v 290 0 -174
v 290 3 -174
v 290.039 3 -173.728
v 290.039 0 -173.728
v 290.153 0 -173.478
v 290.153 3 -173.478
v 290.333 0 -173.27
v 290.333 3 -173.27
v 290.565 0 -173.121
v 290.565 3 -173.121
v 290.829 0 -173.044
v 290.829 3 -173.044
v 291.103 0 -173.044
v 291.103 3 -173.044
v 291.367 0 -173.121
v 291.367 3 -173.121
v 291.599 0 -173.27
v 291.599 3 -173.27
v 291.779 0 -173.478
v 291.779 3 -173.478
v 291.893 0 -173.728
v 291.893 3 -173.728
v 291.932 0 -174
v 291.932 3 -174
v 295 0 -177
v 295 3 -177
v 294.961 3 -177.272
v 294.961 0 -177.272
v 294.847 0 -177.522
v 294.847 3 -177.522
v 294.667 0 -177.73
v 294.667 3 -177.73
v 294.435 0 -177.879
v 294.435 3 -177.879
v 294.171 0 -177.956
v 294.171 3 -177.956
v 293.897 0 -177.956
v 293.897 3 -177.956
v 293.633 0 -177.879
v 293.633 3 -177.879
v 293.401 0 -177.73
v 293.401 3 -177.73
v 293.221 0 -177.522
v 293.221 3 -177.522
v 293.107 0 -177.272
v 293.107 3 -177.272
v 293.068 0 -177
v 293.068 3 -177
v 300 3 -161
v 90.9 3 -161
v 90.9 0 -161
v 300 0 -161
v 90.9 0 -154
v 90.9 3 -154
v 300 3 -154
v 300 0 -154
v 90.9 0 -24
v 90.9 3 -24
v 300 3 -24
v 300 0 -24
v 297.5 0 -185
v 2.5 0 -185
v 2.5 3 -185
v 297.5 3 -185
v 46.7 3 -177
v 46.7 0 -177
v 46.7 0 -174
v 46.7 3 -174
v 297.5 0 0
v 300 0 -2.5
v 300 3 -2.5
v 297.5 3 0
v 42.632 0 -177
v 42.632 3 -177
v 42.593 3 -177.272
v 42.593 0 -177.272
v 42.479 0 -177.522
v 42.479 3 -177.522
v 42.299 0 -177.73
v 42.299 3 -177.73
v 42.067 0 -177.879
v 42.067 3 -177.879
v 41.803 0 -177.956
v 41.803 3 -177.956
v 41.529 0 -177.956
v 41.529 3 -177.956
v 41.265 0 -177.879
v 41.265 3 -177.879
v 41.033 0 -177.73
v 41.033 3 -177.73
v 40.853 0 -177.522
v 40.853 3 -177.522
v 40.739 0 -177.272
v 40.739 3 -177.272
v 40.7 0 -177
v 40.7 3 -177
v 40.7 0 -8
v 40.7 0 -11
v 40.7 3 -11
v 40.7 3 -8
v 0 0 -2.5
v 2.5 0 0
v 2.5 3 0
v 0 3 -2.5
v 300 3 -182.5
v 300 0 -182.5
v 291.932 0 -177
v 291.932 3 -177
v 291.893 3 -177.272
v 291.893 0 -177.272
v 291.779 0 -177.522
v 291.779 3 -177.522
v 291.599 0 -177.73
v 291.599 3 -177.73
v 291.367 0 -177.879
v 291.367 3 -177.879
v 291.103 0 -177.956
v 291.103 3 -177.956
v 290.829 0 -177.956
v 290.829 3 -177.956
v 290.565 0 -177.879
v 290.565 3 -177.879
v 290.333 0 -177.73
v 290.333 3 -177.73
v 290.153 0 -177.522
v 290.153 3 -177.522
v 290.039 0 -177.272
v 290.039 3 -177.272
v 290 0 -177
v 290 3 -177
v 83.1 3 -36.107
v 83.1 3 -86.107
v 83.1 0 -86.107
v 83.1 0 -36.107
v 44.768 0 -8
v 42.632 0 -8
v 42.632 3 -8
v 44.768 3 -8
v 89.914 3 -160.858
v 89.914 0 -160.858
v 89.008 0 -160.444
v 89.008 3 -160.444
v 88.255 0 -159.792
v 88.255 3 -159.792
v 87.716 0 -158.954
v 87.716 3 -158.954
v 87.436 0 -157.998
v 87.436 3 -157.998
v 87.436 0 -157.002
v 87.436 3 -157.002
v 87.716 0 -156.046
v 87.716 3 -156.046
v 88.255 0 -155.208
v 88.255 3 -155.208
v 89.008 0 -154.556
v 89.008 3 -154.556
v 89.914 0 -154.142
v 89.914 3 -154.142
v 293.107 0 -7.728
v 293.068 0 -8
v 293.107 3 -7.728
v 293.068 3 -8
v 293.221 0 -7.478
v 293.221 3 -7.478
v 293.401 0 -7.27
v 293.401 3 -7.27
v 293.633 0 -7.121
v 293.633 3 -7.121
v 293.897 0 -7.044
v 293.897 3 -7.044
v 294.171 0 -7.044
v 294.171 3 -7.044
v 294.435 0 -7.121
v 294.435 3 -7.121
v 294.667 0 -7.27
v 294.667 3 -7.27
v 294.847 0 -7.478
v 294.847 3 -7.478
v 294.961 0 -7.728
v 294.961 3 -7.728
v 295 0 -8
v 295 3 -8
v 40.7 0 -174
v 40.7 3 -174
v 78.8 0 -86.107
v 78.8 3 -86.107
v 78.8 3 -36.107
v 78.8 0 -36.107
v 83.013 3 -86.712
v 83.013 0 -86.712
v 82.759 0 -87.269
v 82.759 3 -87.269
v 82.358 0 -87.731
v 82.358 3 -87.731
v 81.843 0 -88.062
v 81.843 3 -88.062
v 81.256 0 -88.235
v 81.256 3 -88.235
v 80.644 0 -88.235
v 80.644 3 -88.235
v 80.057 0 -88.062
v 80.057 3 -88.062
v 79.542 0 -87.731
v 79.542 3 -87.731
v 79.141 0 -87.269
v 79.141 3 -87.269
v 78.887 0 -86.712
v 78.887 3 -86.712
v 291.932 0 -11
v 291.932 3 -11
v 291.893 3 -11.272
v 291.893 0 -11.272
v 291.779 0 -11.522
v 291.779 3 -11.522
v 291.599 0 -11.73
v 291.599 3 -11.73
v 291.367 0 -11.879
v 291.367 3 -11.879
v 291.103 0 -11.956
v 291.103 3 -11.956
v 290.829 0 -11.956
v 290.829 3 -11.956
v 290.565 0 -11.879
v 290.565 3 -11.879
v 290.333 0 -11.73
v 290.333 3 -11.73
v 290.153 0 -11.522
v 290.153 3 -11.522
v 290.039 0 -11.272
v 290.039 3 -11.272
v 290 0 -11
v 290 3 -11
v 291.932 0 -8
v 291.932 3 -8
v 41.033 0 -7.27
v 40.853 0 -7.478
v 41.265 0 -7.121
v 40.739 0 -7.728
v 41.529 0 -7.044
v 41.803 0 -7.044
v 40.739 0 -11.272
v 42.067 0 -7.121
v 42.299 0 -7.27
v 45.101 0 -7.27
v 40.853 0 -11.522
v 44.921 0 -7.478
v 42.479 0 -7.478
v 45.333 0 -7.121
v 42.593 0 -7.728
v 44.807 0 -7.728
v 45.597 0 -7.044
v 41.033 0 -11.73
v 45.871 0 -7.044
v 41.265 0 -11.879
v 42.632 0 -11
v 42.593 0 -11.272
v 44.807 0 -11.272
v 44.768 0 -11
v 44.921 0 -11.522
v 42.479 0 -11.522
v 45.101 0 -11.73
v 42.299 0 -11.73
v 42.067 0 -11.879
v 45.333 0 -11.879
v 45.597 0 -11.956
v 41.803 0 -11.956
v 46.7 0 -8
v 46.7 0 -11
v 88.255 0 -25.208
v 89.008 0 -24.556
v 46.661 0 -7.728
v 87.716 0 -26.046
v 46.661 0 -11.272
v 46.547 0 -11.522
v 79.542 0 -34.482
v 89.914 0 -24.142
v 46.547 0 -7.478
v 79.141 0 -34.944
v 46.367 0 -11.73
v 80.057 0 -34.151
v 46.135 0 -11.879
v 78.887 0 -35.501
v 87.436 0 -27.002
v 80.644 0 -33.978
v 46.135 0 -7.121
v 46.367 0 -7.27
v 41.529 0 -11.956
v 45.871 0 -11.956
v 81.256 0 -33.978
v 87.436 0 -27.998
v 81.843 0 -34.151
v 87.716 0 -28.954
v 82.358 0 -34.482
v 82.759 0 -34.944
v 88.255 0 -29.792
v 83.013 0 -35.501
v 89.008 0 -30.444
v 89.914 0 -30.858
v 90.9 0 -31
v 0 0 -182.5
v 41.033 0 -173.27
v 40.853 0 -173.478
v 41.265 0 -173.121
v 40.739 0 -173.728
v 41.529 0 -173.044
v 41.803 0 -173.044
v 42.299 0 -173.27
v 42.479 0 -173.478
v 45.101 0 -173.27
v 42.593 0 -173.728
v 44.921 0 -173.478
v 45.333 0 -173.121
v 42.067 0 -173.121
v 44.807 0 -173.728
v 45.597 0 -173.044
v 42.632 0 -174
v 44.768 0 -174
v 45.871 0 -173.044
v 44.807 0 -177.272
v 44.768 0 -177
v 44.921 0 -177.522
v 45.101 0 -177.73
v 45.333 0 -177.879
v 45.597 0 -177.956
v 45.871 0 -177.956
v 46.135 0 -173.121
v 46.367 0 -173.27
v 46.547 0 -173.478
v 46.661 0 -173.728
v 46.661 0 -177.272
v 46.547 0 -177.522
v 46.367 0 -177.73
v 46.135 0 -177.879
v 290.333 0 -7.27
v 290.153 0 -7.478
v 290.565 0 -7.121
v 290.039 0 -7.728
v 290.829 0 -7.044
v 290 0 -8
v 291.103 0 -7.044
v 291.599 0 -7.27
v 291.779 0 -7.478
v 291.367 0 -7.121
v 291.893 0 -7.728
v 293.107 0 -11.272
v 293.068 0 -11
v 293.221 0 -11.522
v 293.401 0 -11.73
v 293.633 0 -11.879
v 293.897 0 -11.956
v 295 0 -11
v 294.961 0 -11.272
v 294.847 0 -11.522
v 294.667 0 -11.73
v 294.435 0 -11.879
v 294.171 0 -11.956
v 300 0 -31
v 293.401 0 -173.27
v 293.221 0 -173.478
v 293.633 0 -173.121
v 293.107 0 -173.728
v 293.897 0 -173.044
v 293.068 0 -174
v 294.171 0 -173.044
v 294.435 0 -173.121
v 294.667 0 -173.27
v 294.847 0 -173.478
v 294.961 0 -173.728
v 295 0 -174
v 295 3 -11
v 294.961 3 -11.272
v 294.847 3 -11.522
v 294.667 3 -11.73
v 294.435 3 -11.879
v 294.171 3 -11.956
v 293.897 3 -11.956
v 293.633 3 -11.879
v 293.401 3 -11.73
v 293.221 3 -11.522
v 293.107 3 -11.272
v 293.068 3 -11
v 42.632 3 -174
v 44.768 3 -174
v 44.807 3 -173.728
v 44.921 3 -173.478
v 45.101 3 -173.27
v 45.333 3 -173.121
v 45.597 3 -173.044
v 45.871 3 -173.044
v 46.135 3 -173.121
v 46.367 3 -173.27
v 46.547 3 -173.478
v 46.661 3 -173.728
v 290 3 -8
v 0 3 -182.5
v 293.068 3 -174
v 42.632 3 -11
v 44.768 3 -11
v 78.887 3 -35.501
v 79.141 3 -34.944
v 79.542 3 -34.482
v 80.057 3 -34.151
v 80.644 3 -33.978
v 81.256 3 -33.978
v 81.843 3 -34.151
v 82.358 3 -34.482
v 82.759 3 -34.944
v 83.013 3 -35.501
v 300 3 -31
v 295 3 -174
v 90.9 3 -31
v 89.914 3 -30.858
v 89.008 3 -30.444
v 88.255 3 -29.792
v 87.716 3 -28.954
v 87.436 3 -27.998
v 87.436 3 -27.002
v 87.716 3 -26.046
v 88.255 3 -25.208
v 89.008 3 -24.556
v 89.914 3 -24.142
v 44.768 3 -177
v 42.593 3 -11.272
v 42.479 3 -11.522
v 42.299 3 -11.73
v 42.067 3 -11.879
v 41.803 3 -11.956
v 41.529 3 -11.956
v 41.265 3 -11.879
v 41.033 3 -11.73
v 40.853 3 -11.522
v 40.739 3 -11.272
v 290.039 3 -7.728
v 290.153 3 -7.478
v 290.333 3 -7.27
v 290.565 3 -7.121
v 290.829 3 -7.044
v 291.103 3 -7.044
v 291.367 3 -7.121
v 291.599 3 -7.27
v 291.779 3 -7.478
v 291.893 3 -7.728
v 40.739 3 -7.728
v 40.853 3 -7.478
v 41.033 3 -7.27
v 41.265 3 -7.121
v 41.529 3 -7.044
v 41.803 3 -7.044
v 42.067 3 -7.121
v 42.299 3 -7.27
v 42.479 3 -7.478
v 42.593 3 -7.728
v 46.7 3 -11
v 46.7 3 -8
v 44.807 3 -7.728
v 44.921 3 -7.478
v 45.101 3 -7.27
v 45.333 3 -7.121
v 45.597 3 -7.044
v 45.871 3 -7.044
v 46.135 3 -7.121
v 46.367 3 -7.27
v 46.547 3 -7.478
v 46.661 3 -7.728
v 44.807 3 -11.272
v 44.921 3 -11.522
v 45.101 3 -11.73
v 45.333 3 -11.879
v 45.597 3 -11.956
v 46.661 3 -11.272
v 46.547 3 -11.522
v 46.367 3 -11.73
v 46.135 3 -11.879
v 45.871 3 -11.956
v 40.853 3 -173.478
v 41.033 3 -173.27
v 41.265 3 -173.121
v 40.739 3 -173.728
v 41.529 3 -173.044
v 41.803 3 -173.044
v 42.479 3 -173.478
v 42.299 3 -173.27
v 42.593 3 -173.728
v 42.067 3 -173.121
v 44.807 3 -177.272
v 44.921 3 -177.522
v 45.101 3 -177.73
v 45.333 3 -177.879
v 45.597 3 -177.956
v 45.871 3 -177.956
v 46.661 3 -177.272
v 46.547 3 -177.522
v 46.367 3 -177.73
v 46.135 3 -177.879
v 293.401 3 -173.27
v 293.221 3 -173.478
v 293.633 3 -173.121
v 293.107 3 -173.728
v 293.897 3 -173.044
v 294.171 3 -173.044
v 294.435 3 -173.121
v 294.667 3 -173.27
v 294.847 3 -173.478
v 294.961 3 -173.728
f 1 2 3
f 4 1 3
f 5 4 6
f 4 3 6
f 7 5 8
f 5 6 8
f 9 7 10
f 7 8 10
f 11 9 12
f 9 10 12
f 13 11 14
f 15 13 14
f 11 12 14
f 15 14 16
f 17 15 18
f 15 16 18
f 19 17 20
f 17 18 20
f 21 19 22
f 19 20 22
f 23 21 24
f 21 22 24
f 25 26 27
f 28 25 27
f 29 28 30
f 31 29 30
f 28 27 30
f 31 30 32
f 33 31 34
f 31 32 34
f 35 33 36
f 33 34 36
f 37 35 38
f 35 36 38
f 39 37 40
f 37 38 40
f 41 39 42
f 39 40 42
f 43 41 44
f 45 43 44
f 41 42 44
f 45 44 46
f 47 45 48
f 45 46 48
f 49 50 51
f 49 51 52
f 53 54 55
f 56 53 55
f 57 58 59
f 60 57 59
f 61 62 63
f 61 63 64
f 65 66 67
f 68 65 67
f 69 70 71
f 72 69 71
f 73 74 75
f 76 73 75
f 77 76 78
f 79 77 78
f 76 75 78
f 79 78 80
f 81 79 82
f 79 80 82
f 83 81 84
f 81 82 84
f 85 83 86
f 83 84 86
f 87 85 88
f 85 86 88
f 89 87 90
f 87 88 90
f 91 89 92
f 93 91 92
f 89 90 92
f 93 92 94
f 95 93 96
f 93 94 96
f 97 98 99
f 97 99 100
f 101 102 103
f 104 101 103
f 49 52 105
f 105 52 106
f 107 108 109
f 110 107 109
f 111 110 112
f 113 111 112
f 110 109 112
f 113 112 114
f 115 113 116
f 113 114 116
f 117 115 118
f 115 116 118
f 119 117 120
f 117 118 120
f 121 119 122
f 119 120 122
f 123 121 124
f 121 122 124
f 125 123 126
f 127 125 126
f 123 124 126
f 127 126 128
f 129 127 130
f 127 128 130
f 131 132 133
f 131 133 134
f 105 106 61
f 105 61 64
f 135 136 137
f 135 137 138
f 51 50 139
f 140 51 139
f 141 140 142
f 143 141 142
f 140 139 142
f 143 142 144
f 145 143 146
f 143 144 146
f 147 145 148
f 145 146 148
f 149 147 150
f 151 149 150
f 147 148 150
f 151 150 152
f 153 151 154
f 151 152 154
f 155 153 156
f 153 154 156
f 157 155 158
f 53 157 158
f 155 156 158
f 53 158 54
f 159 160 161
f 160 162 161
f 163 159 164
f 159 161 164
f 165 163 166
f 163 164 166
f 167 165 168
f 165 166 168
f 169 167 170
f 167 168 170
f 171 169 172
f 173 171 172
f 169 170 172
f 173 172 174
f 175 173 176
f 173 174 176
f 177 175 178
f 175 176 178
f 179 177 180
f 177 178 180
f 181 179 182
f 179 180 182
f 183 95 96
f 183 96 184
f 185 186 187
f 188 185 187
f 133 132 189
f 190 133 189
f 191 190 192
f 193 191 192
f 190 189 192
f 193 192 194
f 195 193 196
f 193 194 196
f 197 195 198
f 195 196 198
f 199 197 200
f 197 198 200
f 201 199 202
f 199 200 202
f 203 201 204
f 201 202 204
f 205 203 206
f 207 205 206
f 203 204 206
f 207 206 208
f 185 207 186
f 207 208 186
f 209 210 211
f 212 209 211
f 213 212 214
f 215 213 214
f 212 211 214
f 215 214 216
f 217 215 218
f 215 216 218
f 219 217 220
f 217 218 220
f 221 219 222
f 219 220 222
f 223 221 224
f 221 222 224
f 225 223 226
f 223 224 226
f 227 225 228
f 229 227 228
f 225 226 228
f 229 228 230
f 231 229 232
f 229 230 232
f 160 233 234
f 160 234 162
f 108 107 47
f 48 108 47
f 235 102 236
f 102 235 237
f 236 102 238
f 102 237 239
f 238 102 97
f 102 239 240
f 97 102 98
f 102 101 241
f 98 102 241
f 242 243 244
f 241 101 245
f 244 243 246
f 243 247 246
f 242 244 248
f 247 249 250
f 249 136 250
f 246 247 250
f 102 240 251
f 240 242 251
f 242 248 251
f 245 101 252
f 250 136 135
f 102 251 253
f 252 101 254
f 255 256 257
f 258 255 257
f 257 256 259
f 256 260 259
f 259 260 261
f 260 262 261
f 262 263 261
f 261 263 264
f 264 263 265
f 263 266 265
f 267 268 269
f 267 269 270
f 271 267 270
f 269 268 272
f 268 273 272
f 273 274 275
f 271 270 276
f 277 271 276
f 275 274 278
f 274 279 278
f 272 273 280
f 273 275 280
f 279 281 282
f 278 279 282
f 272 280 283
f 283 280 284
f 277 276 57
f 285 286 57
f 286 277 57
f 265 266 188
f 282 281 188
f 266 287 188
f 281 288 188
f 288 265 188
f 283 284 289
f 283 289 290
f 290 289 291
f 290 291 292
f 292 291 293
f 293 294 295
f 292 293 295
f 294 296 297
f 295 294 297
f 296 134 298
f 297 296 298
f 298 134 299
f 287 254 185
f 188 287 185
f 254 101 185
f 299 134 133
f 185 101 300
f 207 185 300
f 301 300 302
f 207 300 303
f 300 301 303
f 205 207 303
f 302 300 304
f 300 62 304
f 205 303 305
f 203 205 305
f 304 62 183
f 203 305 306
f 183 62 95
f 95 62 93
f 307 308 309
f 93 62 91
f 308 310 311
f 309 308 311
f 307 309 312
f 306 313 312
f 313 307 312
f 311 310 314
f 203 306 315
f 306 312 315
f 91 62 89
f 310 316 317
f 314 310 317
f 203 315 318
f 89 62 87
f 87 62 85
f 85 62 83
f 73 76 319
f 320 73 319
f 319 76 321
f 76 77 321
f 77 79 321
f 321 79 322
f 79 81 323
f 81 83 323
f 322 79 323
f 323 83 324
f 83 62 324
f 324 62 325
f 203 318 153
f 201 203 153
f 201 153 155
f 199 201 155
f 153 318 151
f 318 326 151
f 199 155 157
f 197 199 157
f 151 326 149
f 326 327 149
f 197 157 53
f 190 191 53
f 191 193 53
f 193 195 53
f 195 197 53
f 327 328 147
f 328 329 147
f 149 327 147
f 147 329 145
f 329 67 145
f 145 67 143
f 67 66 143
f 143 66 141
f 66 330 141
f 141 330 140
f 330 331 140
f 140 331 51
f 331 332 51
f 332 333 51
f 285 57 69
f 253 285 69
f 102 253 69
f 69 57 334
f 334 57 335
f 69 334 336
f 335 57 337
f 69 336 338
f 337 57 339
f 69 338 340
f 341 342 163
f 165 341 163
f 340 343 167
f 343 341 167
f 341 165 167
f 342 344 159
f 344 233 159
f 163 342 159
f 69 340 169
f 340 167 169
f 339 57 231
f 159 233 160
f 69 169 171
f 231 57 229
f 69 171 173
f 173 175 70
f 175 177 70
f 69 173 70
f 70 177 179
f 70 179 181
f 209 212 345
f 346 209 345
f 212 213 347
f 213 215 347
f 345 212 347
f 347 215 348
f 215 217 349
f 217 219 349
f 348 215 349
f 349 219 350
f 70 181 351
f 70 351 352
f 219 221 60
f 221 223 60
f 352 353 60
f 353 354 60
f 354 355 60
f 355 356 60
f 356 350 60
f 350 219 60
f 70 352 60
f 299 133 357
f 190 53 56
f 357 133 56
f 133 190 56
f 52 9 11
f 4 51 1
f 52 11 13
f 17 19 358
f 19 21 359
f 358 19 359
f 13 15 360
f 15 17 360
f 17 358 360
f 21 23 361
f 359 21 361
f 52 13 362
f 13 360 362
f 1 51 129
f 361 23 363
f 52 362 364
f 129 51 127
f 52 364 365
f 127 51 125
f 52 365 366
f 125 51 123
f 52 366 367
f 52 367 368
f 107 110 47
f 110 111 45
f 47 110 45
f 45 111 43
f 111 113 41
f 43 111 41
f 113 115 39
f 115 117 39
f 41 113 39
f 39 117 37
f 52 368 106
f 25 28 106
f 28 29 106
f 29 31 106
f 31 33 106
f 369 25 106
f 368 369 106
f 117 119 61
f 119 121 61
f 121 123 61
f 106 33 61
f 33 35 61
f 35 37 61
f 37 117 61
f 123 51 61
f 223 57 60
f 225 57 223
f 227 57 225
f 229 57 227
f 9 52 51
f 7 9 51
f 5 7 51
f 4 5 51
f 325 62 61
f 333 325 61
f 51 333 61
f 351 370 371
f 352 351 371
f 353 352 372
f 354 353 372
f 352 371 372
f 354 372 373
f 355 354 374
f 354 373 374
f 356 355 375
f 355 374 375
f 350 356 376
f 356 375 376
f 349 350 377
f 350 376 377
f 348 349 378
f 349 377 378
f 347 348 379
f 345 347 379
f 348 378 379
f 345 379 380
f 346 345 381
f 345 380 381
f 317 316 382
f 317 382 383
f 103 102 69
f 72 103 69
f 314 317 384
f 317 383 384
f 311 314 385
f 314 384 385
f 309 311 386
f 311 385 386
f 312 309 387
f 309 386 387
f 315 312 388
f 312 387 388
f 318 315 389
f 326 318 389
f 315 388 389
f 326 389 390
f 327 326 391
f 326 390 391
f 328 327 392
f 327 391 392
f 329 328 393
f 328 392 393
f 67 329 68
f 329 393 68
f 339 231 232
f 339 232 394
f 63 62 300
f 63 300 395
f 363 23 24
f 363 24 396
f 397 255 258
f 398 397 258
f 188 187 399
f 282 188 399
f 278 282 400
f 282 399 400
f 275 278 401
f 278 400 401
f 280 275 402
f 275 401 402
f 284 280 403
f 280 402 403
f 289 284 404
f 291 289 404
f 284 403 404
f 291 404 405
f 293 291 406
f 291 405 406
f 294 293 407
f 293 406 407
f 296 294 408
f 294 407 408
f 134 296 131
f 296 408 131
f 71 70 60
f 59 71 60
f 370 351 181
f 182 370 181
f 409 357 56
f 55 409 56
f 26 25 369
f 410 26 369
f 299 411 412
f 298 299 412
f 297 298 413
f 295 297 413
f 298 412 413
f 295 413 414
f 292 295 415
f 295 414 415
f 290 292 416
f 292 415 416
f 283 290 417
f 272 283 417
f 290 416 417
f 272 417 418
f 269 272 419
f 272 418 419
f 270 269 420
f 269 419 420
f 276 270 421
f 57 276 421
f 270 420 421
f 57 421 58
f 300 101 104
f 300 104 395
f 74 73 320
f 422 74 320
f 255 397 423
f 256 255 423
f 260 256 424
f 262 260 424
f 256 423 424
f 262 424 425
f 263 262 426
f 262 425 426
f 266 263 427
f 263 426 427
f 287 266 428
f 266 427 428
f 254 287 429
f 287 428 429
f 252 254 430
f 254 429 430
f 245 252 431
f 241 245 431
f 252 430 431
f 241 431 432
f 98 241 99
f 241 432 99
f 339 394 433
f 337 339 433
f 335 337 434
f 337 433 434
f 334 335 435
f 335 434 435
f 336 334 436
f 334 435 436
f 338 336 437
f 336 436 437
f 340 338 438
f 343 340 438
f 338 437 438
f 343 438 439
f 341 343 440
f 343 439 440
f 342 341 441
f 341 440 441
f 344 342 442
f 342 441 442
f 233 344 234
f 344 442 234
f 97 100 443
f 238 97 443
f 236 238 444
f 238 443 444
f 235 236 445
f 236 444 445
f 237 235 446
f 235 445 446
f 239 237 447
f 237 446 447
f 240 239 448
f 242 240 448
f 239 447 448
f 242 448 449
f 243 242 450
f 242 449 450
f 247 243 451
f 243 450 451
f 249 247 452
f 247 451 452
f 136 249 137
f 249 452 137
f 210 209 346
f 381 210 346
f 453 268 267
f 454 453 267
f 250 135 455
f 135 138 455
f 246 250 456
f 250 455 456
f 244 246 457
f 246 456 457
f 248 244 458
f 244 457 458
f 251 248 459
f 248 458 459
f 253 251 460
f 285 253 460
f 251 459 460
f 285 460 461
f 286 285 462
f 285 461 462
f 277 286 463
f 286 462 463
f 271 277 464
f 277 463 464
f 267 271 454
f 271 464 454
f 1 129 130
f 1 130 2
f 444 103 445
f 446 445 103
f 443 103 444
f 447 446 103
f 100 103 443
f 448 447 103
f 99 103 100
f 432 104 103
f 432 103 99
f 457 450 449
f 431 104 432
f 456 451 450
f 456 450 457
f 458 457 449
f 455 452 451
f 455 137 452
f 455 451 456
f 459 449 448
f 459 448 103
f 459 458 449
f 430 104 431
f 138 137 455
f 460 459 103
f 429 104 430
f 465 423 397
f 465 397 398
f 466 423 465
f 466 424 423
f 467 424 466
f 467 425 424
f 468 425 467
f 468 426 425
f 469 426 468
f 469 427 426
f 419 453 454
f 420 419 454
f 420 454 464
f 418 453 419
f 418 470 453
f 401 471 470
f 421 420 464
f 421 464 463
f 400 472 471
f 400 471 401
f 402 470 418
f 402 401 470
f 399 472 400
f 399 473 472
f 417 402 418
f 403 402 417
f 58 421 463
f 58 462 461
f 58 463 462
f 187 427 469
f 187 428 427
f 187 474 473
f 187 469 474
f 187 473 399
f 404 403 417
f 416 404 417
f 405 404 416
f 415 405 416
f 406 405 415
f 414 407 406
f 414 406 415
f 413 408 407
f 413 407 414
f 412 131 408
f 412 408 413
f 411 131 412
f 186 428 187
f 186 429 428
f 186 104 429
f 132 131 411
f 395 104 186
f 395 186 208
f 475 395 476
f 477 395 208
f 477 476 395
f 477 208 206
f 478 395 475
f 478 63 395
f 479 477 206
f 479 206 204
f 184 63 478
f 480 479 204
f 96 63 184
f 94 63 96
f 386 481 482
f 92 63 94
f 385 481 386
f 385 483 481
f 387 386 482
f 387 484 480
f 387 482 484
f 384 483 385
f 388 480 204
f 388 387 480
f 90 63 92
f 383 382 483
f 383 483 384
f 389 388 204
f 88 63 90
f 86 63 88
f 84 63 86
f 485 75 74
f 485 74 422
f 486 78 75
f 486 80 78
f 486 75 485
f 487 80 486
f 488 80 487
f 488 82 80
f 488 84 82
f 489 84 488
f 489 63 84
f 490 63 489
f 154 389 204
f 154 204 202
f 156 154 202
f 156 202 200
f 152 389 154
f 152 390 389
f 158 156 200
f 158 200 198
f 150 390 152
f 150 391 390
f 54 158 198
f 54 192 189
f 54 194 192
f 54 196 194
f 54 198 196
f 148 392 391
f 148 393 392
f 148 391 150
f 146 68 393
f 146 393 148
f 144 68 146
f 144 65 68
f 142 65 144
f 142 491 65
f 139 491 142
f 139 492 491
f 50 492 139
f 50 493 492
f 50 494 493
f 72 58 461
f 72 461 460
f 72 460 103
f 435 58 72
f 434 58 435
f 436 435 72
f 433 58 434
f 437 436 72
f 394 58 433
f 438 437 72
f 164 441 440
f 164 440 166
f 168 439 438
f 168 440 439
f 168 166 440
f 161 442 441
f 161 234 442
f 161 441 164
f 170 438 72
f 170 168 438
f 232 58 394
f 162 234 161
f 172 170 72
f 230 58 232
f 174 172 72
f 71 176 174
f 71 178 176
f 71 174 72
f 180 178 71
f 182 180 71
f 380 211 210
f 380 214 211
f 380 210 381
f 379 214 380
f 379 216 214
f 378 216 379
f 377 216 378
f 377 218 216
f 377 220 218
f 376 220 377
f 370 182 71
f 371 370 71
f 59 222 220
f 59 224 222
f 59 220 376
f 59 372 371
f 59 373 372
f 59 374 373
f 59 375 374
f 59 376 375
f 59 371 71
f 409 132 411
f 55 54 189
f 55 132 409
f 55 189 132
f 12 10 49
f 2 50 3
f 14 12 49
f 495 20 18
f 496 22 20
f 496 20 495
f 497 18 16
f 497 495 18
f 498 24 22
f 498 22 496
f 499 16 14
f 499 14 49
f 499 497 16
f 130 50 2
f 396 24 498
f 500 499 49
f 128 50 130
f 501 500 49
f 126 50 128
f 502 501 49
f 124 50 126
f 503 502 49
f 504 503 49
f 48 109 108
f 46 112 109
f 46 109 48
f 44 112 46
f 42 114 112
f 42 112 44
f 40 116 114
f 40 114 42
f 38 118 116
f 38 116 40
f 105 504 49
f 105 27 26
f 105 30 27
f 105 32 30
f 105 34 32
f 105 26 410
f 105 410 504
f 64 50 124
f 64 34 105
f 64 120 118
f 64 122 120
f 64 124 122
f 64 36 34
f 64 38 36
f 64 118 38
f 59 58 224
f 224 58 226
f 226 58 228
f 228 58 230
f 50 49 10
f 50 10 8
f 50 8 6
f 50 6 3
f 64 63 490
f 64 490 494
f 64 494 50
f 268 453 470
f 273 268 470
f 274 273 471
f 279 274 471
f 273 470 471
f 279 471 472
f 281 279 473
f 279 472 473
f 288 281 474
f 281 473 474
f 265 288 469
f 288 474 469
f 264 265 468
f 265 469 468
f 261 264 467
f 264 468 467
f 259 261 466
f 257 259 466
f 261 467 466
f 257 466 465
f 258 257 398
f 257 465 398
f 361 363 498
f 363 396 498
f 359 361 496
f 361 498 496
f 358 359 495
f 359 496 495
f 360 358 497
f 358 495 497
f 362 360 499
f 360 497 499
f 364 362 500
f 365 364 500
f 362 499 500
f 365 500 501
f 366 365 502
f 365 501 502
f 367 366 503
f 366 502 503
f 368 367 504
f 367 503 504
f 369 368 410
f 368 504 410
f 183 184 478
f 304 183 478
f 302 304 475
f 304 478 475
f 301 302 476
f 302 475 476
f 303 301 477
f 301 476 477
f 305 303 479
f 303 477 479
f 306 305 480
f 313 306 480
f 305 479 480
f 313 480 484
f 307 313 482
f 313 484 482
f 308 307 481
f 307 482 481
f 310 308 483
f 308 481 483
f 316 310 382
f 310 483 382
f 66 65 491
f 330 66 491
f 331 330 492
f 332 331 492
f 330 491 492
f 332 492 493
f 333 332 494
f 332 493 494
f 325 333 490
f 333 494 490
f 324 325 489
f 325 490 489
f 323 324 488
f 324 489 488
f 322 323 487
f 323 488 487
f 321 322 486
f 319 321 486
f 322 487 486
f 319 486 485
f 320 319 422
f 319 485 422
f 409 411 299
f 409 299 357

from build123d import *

# Parameters (mm, degrees)
SKETCH_1_W           = 300
SKETCH_1_H           = 185
EXTRUDE_1_DEPTH      = 3
CUT_EXTRUDE_1_DEPTH  = 10
SKETCH_3_R           = 2.15
CUT_EXTRUDE_2_DEPTH  = 10
SKETCH_4_W           = 209.1
SKETCH_4_H           = 7
CUT_EXTRUDE_3_DEPTH  = 10
SKETCH_5_R           = 3.5
CUT_EXTRUDE_5_DEPTH  = 10
CHAMFER_1_SIZE       = 2.5
SKETCH_9_W           = 5
SKETCH_9_H           = 3
SKETCH_9_W_2         = 6
CUT_EXTRUDE_9_DEPTH  = 10
SKETCH_10_R          = 0.965981561
CUT_EXTRUDE_10_DEPTH = 10


with BuildPart() as part:
    # 스케치1 → 보스-돌출1 (new body)
    with BuildSketch(Plane(origin=(0, 0, 0), x_dir=(1, 0, 0), z_dir=(0, 1, 0))):
        with Locations((150, 92.5)):
            Rectangle(SKETCH_1_W, SKETCH_1_H)
    extrude(amount=EXTRUDE_1_DEPTH)

    # 스케치2 → 컷-돌출1 (cut)
    with BuildSketch(Plane(origin=(0, 3, 0), x_dir=(1, 0, 0), z_dir=(0, 1, 0))):
        Polygon((78.8, 61.106579113), (78.8, 86.106579113), (83.1, 86.106579113), (83.1, 36.106579113), (78.8, 36.106579113), align=None)
    extrude(amount=-CUT_EXTRUDE_1_DEPTH, mode=Mode.SUBTRACT)

    # 스케치3 → 컷-돌출2 (cut)
    with BuildSketch(Plane(origin=(0, 3, 0), x_dir=(1, 0, 0), z_dir=(0, 1, 0))):
        with Locations((80.95, 86.106579113)):
            Circle(SKETCH_3_R)
        with Locations((80.95, 36.106579113)):
            Circle(SKETCH_3_R)
    extrude(amount=-CUT_EXTRUDE_2_DEPTH, mode=Mode.SUBTRACT)

    # 스케치4 → 컷-돌출3 (cut)
    with BuildSketch(Plane(origin=(0, 3, 0), x_dir=(1, 0, 0), z_dir=(0, 1, 0))):
        with Locations((195.45, 157.5)):
            Rectangle(SKETCH_4_W, SKETCH_4_H)
        with Locations((195.45, 27.5)):
            Rectangle(SKETCH_4_W, SKETCH_4_H)
    extrude(amount=-CUT_EXTRUDE_3_DEPTH, mode=Mode.SUBTRACT)

    # 스케치5 → 컷-돌출5 (cut)
    with BuildSketch(Plane(origin=(0, 3, 0), x_dir=(1, 0, 0), z_dir=(0, 1, 0))):
        with Locations((90.9, 157.5)):
            Circle(SKETCH_5_R)
        with Locations((90.9, 27.5)):
            Circle(SKETCH_5_R)
    extrude(amount=-CUT_EXTRUDE_5_DEPTH, mode=Mode.SUBTRACT)

    # 모따기1
    chamfer_1_edges = [part.edges().sort_by_distance(p)[0] for p in [
        (0, 1.5, -185),
        (300, 1.5, -185),
        (300, 1.5, 0),
        (0, 1.5, 0),
    ]]
    chamfer(chamfer_1_edges, length=CHAMFER_1_SIZE)

    # 스케치9 → 컷-돌출9 (cut)
    with BuildSketch(Plane.XZ):
        with Locations((292.5, -175.5)):
            Rectangle(SKETCH_9_W, SKETCH_9_H)
        with Locations((43.7, -175.5)):
            Rectangle(SKETCH_9_W_2, SKETCH_9_H)
        with Locations((43.7, -9.5)):
            Rectangle(SKETCH_9_W_2, SKETCH_9_H)
        with Locations((292.5, -9.5)):
            Rectangle(SKETCH_9_W, SKETCH_9_H)
    extrude(amount=-CUT_EXTRUDE_9_DEPTH, mode=Mode.SUBTRACT)

    # 스케치10 → 컷-돌출10 (cut)
    with BuildSketch(Plane(origin=(0, 3, 0), x_dir=(1, 0, 0), z_dir=(0, 1, 0))):
        with Locations((294.034018439, 174)):
            Circle(SKETCH_10_R)
        with Locations((290.965981561, 174)):
            Circle(SKETCH_10_R)
        with Locations((290.965981561, 177)):
            Circle(SKETCH_10_R)
        with Locations((294.034018439, 177)):
            Circle(SKETCH_10_R)
        with Locations((41.665981561, 174)):
            Circle(SKETCH_10_R)
        with Locations((41.665981561, 177)):
            Circle(SKETCH_10_R)
        with Locations((45.734018439, 177)):
            Circle(SKETCH_10_R)
        with Locations((45.734018439, 174)):
            Circle(SKETCH_10_R)
        with Locations((45.734018439, 11)):
            Circle(SKETCH_10_R)
        with Locations((45.734018439, 8)):
            Circle(SKETCH_10_R)
        with Locations((41.665981561, 8)):
            Circle(SKETCH_10_R)
        with Locations((41.665981561, 11)):
            Circle(SKETCH_10_R)
        with Locations((294.034018439, 8)):
            Circle(SKETCH_10_R)
        with Locations((290.965981561, 8)):
            Circle(SKETCH_10_R)
        with Locations((290.965981561, 11)):
            Circle(SKETCH_10_R)
        with Locations((294.034018439, 11)):
            Circle(SKETCH_10_R)
    extrude(amount=-CUT_EXTRUDE_10_DEPTH, mode=Mode.SUBTRACT)


solid = part.part
